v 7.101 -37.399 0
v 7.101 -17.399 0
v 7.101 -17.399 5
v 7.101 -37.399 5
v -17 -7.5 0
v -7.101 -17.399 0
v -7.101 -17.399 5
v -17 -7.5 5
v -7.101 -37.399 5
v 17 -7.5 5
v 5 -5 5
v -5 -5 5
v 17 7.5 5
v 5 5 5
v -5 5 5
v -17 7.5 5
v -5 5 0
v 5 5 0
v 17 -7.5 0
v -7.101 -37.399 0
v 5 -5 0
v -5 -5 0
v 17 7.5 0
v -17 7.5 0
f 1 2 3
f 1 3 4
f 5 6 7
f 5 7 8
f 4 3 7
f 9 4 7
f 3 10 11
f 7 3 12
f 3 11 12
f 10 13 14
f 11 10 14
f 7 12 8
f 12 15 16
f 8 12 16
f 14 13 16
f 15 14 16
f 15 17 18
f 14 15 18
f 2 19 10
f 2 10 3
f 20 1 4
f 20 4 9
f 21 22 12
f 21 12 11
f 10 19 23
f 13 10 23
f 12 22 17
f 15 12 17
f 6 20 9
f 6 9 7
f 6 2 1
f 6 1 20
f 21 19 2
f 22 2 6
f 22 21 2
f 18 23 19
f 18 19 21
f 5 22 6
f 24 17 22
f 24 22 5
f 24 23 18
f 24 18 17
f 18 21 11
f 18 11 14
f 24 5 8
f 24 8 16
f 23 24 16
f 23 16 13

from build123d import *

# Parameters (mm, degrees)
CROQUIS1_W              = 34
CROQUIS1_H              = 15
CROQUIS1_W_2            = 10
CROQUIS1_H_2            = 10
SALIENTE_EXTRUIR1_DEPTH = 5


with BuildPart() as part:
    # Croquis1 → Saliente-Extruir1 (new body)
    # profile 1 of 2: a face of its own
    with BuildSketch(Plane.XY):
        Rectangle(CROQUIS1_W, CROQUIS1_H)
        Rectangle(CROQUIS1_W_2, CROQUIS1_H_2, mode=Mode.SUBTRACT)
    # profile 2 of 2: a face of its own
    with BuildSketch(Plane.XY):
        Polygon((17, -7.5), (7.100505063, -17.399494937), (7.100505063, -37.399494937), (-7.100505063, -37.399494937), (-7.100505063, -17.399494937), (-17, -7.5), align=None)
    extrude(amount=SALIENTE_EXTRUIR1_DEPTH)


solid = part.part
